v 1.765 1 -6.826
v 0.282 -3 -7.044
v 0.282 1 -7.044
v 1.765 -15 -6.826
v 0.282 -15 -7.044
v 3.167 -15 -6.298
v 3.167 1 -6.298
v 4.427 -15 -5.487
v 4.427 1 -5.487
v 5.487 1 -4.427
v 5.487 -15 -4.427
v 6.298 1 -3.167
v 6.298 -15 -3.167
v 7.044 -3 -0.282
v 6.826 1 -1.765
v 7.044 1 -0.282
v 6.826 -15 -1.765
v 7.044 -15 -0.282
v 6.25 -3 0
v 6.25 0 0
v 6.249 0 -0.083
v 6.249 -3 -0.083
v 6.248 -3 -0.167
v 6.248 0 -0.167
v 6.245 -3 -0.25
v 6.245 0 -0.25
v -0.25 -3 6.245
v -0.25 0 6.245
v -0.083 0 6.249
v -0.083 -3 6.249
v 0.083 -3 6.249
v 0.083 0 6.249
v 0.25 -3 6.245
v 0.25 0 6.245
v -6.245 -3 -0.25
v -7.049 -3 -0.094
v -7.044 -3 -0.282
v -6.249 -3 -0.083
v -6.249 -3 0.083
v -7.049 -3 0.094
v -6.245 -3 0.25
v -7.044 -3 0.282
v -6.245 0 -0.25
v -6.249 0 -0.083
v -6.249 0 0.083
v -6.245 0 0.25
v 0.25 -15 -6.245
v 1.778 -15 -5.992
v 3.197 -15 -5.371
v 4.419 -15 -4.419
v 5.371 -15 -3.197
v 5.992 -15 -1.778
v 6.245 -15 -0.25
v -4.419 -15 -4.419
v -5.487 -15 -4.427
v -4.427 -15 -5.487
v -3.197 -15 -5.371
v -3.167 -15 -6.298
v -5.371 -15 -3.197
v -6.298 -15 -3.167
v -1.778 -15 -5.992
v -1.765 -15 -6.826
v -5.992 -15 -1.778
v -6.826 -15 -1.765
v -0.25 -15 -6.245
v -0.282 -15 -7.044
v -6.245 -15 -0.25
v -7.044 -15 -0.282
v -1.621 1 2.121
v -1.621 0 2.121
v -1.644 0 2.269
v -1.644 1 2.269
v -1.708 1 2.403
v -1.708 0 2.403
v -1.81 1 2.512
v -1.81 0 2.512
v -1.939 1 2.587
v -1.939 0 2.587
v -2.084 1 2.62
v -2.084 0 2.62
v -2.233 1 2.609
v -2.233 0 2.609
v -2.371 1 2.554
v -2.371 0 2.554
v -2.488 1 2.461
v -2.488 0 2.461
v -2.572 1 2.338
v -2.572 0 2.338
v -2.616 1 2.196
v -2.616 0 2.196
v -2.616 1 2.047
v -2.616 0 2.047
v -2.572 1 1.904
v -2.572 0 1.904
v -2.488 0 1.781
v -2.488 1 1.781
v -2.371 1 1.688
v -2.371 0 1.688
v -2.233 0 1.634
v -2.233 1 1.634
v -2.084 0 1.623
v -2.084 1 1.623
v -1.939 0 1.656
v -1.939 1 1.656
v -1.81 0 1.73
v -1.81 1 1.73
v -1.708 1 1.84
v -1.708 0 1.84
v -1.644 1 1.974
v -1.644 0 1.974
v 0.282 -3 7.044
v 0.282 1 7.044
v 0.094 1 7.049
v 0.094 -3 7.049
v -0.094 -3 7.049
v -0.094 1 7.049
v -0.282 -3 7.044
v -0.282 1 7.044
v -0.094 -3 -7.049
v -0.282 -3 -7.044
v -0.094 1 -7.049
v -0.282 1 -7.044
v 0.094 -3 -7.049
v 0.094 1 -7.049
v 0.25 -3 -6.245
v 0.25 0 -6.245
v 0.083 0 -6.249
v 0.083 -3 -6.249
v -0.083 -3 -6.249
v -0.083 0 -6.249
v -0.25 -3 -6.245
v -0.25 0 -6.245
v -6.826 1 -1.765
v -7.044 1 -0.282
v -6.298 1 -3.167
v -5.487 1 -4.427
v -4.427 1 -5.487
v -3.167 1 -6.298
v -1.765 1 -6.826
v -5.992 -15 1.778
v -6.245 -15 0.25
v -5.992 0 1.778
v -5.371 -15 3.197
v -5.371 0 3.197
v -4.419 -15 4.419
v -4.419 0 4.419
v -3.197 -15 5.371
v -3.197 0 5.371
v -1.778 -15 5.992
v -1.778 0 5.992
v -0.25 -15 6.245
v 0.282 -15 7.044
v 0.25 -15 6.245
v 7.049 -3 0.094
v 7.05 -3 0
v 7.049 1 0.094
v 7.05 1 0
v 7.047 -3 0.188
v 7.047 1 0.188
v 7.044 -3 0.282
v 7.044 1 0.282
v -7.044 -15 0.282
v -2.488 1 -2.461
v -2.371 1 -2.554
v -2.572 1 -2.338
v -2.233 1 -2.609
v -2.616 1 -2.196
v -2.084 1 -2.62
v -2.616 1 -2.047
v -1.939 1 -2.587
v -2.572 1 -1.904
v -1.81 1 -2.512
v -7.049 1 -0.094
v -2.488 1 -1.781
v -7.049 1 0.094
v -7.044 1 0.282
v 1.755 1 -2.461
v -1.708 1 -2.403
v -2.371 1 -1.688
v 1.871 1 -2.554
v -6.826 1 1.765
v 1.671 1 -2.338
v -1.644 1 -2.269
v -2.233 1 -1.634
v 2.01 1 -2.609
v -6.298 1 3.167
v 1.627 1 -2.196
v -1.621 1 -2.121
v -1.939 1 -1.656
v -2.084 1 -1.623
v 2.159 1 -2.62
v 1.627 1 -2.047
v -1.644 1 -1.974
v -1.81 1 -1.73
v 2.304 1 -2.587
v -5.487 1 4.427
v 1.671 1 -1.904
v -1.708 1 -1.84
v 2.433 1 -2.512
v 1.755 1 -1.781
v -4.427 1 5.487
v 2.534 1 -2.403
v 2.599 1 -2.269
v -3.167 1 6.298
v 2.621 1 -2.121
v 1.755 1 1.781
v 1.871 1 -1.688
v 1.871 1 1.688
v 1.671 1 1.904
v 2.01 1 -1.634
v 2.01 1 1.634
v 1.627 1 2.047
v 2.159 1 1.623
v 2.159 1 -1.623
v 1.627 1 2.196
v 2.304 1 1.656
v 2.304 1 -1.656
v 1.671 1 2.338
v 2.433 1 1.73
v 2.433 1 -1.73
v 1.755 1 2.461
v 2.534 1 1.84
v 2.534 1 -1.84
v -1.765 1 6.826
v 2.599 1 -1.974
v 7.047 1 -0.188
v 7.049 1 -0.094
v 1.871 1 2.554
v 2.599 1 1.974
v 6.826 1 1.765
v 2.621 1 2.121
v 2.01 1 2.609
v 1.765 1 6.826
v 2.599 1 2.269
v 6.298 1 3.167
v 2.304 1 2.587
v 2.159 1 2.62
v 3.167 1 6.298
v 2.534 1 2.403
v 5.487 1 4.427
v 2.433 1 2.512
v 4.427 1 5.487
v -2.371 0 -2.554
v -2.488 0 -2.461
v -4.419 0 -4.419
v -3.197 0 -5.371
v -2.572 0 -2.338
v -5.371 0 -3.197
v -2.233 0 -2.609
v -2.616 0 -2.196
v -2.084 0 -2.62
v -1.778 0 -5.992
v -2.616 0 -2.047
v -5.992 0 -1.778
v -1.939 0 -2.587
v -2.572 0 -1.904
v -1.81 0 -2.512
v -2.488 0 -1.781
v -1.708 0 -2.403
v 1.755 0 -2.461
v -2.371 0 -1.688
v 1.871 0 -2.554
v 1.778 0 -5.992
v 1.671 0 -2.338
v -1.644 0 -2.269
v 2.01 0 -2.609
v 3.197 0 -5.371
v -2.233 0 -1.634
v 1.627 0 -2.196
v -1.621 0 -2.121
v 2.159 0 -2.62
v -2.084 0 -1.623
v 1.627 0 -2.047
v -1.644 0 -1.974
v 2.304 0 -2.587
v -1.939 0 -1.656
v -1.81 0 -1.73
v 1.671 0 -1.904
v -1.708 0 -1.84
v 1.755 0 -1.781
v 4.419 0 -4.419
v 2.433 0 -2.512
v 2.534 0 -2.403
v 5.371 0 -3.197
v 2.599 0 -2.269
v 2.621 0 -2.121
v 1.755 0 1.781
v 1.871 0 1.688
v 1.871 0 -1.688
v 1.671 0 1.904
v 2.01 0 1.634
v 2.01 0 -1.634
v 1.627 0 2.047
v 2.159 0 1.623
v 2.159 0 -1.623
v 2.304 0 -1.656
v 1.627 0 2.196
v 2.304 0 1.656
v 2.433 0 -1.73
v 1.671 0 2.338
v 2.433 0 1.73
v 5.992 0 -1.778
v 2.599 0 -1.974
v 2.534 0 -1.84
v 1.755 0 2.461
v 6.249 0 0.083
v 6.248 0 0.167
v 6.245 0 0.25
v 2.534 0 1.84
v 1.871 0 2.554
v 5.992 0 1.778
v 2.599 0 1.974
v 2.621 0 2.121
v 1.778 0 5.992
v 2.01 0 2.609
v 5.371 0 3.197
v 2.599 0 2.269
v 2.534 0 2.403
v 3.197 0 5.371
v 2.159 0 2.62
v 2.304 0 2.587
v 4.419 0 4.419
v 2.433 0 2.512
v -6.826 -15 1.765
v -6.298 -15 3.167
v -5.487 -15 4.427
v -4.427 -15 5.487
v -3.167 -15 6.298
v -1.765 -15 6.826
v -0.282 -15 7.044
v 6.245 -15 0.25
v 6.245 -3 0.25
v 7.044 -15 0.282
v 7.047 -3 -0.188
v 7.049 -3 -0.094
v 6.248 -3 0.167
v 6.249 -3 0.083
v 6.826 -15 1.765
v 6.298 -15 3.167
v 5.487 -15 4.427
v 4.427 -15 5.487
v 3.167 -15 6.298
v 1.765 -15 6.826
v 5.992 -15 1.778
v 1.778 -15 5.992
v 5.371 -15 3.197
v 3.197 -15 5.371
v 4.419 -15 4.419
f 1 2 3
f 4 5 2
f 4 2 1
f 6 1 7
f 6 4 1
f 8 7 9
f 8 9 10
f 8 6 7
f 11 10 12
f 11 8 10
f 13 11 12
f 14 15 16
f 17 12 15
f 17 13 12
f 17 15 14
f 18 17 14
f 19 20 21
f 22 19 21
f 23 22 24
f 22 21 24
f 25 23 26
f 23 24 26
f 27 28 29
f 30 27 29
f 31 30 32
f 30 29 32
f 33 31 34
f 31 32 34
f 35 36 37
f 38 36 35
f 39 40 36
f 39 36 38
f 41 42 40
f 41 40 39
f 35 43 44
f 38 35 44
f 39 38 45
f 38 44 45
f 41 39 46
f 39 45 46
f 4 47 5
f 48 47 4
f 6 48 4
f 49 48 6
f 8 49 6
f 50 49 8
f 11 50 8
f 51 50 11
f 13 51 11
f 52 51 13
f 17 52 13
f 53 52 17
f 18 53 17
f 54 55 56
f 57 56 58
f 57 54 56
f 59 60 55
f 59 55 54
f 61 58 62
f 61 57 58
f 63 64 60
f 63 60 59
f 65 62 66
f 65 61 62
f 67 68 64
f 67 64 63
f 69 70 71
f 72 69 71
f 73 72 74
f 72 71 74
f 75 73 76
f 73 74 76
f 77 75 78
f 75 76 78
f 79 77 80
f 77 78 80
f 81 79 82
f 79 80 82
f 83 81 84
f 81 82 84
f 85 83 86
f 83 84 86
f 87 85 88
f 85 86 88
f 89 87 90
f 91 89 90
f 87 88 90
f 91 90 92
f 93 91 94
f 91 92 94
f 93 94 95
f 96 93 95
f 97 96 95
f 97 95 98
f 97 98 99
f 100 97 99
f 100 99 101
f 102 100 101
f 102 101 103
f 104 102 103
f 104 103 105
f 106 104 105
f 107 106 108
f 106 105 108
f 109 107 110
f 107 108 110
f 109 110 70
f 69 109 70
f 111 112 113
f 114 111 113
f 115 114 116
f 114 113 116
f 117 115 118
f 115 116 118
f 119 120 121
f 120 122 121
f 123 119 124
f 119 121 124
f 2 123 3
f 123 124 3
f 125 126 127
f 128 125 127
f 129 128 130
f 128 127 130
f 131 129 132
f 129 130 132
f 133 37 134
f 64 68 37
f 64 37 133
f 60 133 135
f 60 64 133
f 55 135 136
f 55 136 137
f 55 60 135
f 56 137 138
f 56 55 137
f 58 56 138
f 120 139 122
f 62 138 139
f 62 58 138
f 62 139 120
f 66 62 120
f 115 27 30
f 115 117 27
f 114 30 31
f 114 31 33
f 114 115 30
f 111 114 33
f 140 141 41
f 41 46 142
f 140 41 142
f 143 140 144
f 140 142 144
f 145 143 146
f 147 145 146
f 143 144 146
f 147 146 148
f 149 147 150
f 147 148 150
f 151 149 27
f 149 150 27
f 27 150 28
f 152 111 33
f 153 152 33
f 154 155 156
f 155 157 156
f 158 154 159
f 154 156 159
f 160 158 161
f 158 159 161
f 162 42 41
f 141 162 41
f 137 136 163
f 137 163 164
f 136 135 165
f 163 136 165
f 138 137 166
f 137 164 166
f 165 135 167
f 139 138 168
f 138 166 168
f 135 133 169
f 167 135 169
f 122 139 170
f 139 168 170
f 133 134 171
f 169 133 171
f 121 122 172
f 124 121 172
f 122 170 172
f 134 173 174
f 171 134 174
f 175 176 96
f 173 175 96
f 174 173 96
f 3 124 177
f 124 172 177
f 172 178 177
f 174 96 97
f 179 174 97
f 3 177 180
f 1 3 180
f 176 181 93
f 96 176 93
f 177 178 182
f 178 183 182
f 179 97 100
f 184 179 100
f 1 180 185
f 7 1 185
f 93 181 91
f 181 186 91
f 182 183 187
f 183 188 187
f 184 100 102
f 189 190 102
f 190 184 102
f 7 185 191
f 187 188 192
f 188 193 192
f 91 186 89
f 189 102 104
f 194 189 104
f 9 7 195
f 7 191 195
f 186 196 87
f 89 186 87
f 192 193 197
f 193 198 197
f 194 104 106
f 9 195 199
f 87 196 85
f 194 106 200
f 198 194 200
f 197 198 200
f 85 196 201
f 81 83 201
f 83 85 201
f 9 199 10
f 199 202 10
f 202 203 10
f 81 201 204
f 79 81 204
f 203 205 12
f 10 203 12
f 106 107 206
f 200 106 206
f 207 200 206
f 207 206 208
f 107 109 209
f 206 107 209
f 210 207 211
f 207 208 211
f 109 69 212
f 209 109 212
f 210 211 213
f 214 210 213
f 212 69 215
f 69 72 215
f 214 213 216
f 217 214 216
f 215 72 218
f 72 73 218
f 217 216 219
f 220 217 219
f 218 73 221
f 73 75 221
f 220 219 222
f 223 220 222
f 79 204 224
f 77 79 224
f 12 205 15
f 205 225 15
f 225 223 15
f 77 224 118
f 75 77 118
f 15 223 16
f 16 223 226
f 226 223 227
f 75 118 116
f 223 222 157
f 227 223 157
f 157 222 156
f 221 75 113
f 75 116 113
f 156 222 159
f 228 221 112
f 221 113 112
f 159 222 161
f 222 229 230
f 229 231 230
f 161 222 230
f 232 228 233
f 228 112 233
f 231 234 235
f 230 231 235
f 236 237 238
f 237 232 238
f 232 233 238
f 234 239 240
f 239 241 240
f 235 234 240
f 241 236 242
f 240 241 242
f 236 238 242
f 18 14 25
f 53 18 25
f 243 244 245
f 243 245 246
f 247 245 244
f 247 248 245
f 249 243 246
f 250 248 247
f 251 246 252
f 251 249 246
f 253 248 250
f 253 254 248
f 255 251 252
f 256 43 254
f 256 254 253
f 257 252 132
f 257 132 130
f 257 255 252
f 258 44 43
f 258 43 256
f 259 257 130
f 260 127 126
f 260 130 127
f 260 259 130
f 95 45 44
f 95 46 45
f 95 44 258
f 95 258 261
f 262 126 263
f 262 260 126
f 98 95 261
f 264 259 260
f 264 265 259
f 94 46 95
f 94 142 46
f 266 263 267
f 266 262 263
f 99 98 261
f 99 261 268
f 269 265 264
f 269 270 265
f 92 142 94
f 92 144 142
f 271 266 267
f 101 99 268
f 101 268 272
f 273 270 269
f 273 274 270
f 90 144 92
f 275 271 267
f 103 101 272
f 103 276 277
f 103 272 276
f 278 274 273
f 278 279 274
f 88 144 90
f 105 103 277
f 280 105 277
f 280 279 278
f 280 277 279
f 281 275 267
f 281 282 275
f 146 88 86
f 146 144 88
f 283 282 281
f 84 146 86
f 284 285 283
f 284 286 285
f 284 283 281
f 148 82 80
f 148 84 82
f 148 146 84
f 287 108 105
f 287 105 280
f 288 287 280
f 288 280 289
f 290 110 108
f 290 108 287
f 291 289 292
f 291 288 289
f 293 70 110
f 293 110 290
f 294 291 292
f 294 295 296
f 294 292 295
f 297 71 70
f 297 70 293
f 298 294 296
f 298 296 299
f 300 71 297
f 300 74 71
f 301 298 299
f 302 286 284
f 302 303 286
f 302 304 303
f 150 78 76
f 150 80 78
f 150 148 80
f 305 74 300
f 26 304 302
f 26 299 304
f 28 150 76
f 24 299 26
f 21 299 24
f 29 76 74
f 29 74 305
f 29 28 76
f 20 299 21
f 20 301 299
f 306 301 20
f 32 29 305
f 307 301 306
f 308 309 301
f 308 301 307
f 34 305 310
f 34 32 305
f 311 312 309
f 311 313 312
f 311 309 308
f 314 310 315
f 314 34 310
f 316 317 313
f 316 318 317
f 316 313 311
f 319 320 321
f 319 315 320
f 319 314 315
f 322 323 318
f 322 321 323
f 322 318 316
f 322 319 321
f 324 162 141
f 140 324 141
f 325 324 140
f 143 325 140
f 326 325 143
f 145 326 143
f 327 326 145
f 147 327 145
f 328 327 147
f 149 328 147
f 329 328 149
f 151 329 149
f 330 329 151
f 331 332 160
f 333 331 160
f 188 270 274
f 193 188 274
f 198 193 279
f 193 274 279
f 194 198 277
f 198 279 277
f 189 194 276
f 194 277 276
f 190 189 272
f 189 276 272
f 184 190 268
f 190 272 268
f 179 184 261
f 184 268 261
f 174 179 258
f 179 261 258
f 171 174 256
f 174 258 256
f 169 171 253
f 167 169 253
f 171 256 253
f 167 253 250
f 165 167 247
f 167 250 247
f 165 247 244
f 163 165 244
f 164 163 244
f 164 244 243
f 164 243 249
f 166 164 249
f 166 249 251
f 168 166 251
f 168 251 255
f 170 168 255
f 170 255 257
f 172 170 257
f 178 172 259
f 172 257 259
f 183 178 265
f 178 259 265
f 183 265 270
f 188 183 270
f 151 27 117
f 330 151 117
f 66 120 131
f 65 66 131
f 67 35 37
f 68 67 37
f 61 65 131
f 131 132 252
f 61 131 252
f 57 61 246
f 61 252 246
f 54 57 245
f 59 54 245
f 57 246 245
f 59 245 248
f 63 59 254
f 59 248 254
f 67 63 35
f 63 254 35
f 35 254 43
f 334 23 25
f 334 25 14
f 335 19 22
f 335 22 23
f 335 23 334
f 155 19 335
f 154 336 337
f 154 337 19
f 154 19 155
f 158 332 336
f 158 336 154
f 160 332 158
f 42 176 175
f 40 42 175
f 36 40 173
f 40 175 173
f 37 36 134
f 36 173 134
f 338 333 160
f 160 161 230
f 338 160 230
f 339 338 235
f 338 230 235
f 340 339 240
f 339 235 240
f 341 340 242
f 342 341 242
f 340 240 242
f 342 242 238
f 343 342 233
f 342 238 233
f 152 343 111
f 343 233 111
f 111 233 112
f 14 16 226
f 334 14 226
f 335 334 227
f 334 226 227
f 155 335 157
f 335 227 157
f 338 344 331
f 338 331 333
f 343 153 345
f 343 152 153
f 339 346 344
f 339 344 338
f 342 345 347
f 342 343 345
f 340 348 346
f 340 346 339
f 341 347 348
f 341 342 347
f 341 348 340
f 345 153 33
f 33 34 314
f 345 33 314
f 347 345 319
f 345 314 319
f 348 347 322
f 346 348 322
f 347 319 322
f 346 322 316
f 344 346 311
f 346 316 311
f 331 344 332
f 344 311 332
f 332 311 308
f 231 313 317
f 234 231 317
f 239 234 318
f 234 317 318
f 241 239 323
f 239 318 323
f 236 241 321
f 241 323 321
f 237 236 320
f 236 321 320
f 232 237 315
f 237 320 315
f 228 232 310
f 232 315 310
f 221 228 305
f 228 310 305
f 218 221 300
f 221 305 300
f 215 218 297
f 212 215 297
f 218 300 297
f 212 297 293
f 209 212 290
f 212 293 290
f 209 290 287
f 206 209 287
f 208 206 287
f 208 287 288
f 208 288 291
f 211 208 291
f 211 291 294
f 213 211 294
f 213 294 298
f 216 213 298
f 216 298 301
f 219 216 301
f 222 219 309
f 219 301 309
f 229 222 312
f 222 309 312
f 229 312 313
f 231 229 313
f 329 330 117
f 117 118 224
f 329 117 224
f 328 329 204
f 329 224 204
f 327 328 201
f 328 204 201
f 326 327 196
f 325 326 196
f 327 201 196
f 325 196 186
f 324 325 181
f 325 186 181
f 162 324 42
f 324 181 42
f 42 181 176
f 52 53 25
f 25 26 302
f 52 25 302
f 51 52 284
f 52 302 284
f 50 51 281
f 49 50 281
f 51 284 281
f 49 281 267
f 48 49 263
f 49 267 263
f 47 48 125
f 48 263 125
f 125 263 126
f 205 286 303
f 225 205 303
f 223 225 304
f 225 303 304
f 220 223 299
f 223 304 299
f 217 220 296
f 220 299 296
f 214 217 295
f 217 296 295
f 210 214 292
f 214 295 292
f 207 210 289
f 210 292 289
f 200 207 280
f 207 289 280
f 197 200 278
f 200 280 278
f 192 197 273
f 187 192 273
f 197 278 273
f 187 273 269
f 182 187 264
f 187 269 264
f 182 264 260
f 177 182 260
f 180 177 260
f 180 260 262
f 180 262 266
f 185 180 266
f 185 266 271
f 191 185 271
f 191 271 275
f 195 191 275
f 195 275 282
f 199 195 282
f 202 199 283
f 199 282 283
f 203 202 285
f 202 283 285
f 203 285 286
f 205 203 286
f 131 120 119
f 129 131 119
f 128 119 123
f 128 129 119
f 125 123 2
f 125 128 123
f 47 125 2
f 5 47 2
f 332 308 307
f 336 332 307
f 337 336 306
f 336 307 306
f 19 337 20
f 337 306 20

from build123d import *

# Parameters (mm, degrees)
F0_R     = 0.5
F1_DEPTH = 1
F2_DEPTH = 15
F3_DEPTH = 3


with BuildPart() as f1:
    # F0 (on Front) → F1 (new body)
    with BuildSketch(Plane.XZ):
        with BuildLine():
            ThreePointArc((-6.244998, 0.25), (-4.419417, 4.419417), (-0.25, 6.244998))
            Line((-0.25, 6.244998), (-0.282, 7.044358))
            ThreePointArc((-0.282, 7.044358), (-4.985103, 4.985103), (-7.044358, 0.282))
            Line((-7.044358, 0.282), (-6.244998, 0.25))
        make_face()
        with BuildLine():
            ThreePointArc((-0.25, 6.244998), (0, 6.25), (0.25, 6.244998))
            Line((0.25, 6.244998), (0.282, 7.044358))
            ThreePointArc((0.282, 7.044358), (0, 7.05), (-0.282, 7.044358))
            Line((-0.282, 7.044358), (-0.25, 6.244998))
        make_face()
        with BuildLine():
            ThreePointArc((6.25, 0), (6.248749, 0.125025), (6.244998, 0.25))
            ThreePointArc((6.244998, 0.25), (4.419417, 4.419417), (0.25, 6.244998))
            ThreePointArc((0.25, 6.244998), (0, 6.25), (-0.25, 6.244998))
            ThreePointArc((-0.25, 6.244998), (-4.419417, 4.419417), (-6.244998, 0.25))
            ThreePointArc((-6.244998, 0.25), (-6.25, 0), (-6.244998, -0.25))
            ThreePointArc((-6.244998, -0.25), (-4.419417, -4.419417), (-0.25, -6.244998))
            ThreePointArc((-0.25, -6.244998), (0, -6.25), (0.25, -6.244998))
            ThreePointArc((0.25, -6.244998), (4.419417, -4.419417), (6.244998, -0.25))
            ThreePointArc((6.244998, -0.25), (6.248749, -0.125025), (6.25, 0))
        make_face()
        with Locations((-2.12132, -2.12132)):
            Circle(F0_R, mode=Mode.SUBTRACT)
        with Locations((2.12132, -2.12132)):
            Circle(F0_R, mode=Mode.SUBTRACT)
        with Locations((-2.12132, 2.12132)):
            Circle(F0_R, mode=Mode.SUBTRACT)
        with Locations((2.12132, 2.12132)):
            Circle(F0_R, mode=Mode.SUBTRACT)
        with BuildLine():
            ThreePointArc((0.25, 6.244998), (4.419417, 4.419417), (6.244998, 0.25))
            Line((6.244998, 0.25), (7.044358, 0.282))
            ThreePointArc((7.044358, 0.282), (4.985103, 4.985103), (0.282, 7.044358))
            Line((0.282, 7.044358), (0.25, 6.244998))
        make_face()
        with BuildLine():
            Line((7.044358, 0.282), (6.244998, 0.25))
            ThreePointArc((6.244998, 0.25), (6.248749, 0.125025), (6.25, 0))
            ThreePointArc((6.25, 0), (6.248749, -0.125025), (6.244998, -0.25))
            Line((6.244998, -0.25), (7.044358, -0.282))
            ThreePointArc((7.044358, -0.282), (7.048589, -0.141028), (7.05, 0))
            ThreePointArc((7.05, 0), (7.048589, 0.141028), (7.044358, 0.282))
        make_face()
        with BuildLine():
            Line((7.044358, -0.282), (6.244998, -0.25))
            ThreePointArc((6.244998, -0.25), (4.419417, -4.419417), (0.25, -6.244998))
            Line((0.25, -6.244998), (0.282, -7.044358))
            ThreePointArc((0.282, -7.044358), (4.985103, -4.985103), (7.044358, -0.282))
        make_face()
        with BuildLine():
            Line((0.282, -7.044358), (0.25, -6.244998))
            ThreePointArc((0.25, -6.244998), (0, -6.25), (-0.25, -6.244998))
            Line((-0.25, -6.244998), (-0.282, -7.044358))
            ThreePointArc((-0.282, -7.044358), (0, -7.05), (0.282, -7.044358))
        make_face()
        with BuildLine():
            ThreePointArc((-0.25, -6.244998), (-4.419417, -4.419417), (-6.244998, -0.25))
            Line((-6.244998, -0.25), (-7.044358, -0.282))
            ThreePointArc((-7.044358, -0.282), (-4.985103, -4.985103), (-0.282, -7.044358))
            Line((-0.282, -7.044358), (-0.25, -6.244998))
        make_face()
        with BuildLine():
            ThreePointArc((-6.244998, -0.25), (-6.25, 0), (-6.244998, 0.25))
            Line((-6.244998, 0.25), (-7.044358, 0.282))
            ThreePointArc((-7.044358, 0.282), (-7.05, 0), (-7.044358, -0.282))
            Line((-7.044358, -0.282), (-6.244998, -0.25))
        make_face()
    extrude(amount=-F1_DEPTH)

    # F0 (on Front) → F2 (join)
    with BuildSketch(Plane.XZ):
        with BuildLine():
            ThreePointArc((-6.244998, 0.25), (-4.419417, 4.419417), (-0.25, 6.244998))
            Line((-0.25, 6.244998), (-0.282, 7.044358))
            ThreePointArc((-0.282, 7.044358), (-4.985103, 4.985103), (-7.044358, 0.282))
            Line((-7.044358, 0.282), (-6.244998, 0.25))
        make_face()
        with BuildLine():
            ThreePointArc((0.25, 6.244998), (4.419417, 4.419417), (6.244998, 0.25))
            Line((6.244998, 0.25), (7.044358, 0.282))
            ThreePointArc((7.044358, 0.282), (4.985103, 4.985103), (0.282, 7.044358))
            Line((0.282, 7.044358), (0.25, 6.244998))
        make_face()
        with BuildLine():
            Line((7.044358, -0.282), (6.244998, -0.25))
            ThreePointArc((6.244998, -0.25), (4.419417, -4.419417), (0.25, -6.244998))
            Line((0.25, -6.244998), (0.282, -7.044358))
            ThreePointArc((0.282, -7.044358), (4.985103, -4.985103), (7.044358, -0.282))
        make_face()
        with BuildLine():
            ThreePointArc((-0.25, -6.244998), (-4.419417, -4.419417), (-6.244998, -0.25))
            Line((-6.244998, -0.25), (-7.044358, -0.282))
            ThreePointArc((-7.044358, -0.282), (-4.985103, -4.985103), (-0.282, -7.044358))
            Line((-0.282, -7.044358), (-0.25, -6.244998))
        make_face()
    extrude(amount=F2_DEPTH)

    # F0 (on Front) → F3 (join)
    with BuildSketch(Plane.XZ):
        with BuildLine():
            ThreePointArc((-6.244998, -0.25), (-6.25, 0), (-6.244998, 0.25))
            Line((-6.244998, 0.25), (-7.044358, 0.282))
            ThreePointArc((-7.044358, 0.282), (-7.05, 0), (-7.044358, -0.282))
            Line((-7.044358, -0.282), (-6.244998, -0.25))
        make_face()
        with BuildLine():
            Line((0.282, -7.044358), (0.25, -6.244998))
            ThreePointArc((0.25, -6.244998), (0, -6.25), (-0.25, -6.244998))
            Line((-0.25, -6.244998), (-0.282, -7.044358))
            ThreePointArc((-0.282, -7.044358), (0, -7.05), (0.282, -7.044358))
        make_face()
        with BuildLine():
            Line((7.044358, 0.282), (6.244998, 0.25))
            ThreePointArc((6.244998, 0.25), (6.248749, 0.125025), (6.25, 0))
            ThreePointArc((6.25, 0), (6.248749, -0.125025), (6.244998, -0.25))
            Line((6.244998, -0.25), (7.044358, -0.282))
            ThreePointArc((7.044358, -0.282), (7.048589, -0.141028), (7.05, 0))
            ThreePointArc((7.05, 0), (7.048589, 0.141028), (7.044358, 0.282))
        make_face()
        with BuildLine():
            ThreePointArc((-0.25, 6.244998), (0, 6.25), (0.25, 6.244998))
            Line((0.25, 6.244998), (0.282, 7.044358))
            ThreePointArc((0.282, 7.044358), (0, 7.05), (-0.282, 7.044358))
            Line((-0.282, 7.044358), (-0.25, 6.244998))
        make_face()
    extrude(amount=F3_DEPTH)


solid = f1.part
